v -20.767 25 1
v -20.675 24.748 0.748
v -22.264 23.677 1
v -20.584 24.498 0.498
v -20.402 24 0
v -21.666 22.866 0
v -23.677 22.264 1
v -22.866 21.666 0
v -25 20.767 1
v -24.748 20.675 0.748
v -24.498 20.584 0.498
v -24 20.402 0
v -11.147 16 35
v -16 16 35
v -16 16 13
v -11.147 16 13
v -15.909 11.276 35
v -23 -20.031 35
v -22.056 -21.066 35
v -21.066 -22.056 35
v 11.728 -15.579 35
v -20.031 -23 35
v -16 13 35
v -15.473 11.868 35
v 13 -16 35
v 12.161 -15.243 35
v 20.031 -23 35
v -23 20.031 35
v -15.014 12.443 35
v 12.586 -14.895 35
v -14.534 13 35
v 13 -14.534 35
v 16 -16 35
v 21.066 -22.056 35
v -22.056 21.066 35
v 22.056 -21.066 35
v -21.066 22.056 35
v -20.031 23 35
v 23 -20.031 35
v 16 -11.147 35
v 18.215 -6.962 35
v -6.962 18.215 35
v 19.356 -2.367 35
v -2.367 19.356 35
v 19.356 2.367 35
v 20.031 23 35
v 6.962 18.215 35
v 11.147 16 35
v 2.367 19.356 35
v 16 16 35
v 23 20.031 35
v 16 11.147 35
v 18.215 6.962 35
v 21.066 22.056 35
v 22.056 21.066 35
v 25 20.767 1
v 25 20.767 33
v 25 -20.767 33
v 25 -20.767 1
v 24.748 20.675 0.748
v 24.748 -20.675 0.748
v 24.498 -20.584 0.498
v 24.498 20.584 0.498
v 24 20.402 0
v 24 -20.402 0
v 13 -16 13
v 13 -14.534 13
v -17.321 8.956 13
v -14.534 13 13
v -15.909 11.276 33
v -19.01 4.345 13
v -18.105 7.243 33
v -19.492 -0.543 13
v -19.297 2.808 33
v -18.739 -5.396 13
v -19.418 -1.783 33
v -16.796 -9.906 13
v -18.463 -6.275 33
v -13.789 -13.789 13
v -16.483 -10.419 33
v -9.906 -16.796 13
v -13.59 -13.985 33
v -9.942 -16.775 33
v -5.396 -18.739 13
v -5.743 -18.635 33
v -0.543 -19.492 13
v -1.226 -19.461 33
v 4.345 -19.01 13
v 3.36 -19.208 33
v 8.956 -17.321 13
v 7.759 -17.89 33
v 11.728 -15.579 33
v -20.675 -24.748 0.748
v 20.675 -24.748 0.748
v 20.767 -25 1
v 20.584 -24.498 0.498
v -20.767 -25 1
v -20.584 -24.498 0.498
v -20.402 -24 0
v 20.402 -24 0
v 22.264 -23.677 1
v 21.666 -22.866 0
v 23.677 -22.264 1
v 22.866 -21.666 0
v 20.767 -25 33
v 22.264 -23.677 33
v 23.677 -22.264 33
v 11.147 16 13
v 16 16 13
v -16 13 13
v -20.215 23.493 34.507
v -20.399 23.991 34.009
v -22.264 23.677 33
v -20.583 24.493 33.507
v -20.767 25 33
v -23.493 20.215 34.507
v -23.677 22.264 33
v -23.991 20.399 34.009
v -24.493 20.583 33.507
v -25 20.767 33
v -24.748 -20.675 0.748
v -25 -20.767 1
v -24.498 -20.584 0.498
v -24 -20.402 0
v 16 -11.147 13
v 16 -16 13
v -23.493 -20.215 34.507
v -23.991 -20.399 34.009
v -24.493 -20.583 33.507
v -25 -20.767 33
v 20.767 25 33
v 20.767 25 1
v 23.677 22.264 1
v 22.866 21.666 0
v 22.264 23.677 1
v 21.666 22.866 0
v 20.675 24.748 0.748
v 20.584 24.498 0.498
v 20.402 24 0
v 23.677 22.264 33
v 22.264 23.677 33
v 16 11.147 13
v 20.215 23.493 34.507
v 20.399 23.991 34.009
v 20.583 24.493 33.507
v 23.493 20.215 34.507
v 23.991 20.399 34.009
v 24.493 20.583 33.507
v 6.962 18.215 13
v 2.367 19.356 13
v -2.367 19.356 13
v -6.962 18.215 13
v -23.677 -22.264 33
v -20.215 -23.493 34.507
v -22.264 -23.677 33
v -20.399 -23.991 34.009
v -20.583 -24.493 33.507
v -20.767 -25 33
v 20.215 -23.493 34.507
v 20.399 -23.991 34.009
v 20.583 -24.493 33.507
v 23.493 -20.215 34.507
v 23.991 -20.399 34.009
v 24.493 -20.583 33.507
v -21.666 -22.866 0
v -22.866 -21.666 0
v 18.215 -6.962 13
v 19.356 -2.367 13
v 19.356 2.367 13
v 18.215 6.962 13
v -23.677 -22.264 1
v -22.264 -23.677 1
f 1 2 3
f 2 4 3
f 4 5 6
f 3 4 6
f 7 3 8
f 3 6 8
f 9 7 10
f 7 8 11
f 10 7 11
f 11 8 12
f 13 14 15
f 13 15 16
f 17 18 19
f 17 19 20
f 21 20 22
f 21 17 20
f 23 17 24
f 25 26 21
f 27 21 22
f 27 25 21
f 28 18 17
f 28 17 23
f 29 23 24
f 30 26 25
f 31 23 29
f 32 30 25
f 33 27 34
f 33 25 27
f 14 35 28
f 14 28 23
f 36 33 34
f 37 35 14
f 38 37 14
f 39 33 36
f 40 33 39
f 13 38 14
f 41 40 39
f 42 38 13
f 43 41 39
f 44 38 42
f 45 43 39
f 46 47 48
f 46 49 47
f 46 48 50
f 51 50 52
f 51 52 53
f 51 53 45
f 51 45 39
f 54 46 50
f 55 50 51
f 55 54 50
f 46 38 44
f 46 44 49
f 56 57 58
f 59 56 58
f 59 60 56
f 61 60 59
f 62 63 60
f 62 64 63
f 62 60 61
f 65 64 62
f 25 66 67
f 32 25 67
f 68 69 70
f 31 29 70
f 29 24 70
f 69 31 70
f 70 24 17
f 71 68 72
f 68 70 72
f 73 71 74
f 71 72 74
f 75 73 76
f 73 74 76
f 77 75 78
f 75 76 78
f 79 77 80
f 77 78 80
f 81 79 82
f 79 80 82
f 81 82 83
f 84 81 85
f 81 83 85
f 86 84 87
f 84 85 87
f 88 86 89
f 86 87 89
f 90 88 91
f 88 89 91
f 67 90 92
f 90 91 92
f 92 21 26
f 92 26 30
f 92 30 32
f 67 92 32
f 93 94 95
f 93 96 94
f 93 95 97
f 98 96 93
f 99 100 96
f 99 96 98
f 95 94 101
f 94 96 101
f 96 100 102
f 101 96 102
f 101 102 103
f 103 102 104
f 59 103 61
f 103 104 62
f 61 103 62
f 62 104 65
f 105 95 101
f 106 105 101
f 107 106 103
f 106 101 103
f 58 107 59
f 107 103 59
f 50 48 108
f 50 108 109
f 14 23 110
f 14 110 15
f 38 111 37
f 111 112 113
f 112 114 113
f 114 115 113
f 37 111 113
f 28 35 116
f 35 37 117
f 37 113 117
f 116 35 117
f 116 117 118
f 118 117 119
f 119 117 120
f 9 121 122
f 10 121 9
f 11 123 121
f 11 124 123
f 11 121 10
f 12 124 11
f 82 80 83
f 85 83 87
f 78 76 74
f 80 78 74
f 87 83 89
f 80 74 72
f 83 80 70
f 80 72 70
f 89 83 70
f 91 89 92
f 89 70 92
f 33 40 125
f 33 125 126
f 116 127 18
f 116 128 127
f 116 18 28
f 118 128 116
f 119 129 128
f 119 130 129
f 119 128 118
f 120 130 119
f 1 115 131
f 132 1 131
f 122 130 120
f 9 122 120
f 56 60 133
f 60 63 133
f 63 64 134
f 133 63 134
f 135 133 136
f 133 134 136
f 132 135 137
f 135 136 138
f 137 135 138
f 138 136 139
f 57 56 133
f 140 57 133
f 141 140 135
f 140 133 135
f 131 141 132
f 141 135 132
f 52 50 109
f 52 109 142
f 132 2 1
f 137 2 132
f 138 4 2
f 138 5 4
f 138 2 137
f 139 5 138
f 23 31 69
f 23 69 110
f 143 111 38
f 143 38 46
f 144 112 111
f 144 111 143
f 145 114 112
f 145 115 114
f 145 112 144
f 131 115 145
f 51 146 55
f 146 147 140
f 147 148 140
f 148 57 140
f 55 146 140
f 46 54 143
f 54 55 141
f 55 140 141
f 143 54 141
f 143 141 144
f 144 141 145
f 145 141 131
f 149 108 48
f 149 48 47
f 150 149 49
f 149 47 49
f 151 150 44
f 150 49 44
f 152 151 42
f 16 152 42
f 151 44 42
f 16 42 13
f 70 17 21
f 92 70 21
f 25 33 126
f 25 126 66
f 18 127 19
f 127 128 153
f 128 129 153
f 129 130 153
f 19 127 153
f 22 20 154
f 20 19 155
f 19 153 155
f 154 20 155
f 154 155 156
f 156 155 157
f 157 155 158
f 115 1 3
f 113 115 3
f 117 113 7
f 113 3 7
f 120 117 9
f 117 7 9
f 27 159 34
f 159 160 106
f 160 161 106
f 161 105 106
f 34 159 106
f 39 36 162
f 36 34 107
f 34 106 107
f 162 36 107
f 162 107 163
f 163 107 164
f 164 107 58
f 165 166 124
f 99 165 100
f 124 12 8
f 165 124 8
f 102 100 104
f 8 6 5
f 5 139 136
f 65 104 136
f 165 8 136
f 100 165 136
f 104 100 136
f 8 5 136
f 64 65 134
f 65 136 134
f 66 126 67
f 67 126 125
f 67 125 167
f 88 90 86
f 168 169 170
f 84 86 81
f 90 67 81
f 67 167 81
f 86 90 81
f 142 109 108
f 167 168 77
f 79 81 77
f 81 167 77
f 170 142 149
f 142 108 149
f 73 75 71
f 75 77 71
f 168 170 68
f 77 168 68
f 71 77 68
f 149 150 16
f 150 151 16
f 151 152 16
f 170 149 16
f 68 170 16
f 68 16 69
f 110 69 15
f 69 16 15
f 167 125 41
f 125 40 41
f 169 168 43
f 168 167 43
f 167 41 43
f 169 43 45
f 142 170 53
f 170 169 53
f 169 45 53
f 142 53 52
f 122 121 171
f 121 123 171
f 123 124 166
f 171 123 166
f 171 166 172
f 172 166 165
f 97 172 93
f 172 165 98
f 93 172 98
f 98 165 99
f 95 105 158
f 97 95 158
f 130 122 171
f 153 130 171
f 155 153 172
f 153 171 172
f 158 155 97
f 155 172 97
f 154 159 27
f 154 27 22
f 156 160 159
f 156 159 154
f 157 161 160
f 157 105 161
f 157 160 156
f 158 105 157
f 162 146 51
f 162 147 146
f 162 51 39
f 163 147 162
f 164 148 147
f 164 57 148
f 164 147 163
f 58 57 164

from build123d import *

# Parameters (mm, degrees)
SKETCH_R        = 32.5
PAD_DEPTH       = 35
POCKET_DEPTH    = 22
SKETCH002_R     = 19.5
POCKET001_DEPTH = 22
POCKET002_DEPTH = 35.001
PAD001_DEPTH    = 2
CHAMFER_SIZE    = 2
CHAMFER001_SIZE = 1


with BuildPart() as part:
    # Sketch → Pad (new body)
    with BuildSketch(Plane.XY):
        Circle(SKETCH_R)
    extrude(amount=PAD_DEPTH)

    # Sketch001 (on Face3 of Pad) → Pocket (cut)
    with BuildSketch(Plane.XY.offset(35)):
        Polygon((-16, 16), (16, 16), (16, -16), (13, -16), (13, 13), (-16, 13), align=None)
    extrude(amount=-POCKET_DEPTH, mode=Mode.SUBTRACT)

    # Sketch002 (on Face3 of Pocket) → Pocket001 (cut)
    with BuildSketch(Plane.XY.offset(35)):
        Circle(SKETCH002_R)
    extrude(amount=-POCKET001_DEPTH, mode=Mode.SUBTRACT)

    # Sketch003 (on Face3 of Pocket001) → Pocket002 (cut, through all)
    with BuildSketch(Plane.XY.offset(35)):
        Polygon((25, 25), (25, -25), (67.494446, -25), (72.347168, 49.819519), (-56.328224, 49.819519), (-56.328224, -44.339888), (22.106388, -44.339888), (28.22, -25), (-25, -25), (-25, 25), align=None)
    extrude(amount=-POCKET002_DEPTH, mode=Mode.SUBTRACT)

    # Sketch004 (on Face4 of Pocket002) → Pad001 (join)
    with BuildSketch(Plane.XY.offset(35)):
        with BuildLine():
            ThreePointArc((-17.789269, 13.103439), (-15.397541, -15.845313), (13.607864, -17.406443))
            Line((-17.789269, 13.103439), (13.607864, -17.406443))
        make_face()
    extrude(amount=-PAD001_DEPTH)

    # Chamfer
    chamfer_edges = [part.edges().sort_by_distance(p)[0] for p in [
        (0, -25, 35),
        (22.98097, -22.98097, 35),
        (25, 0, 35),
        (22.98097, 22.98097, 35),
        (0, 25, 35),
        (-22.98097, 22.98097, 35),
        (-25, 0, 35),
        (-22.98097, -22.98097, 35),
    ]]
    chamfer(chamfer_edges, length=CHAMFER_SIZE)

    # Chamfer001
    chamfer001_edges = [part.edges().sort_by_distance(p)[0] for p in [
        (25, 0, 0),
        (22.98097, -22.98097, 0),
        (0, -25, 0),
        (-22.98097, -22.98097, 0),
        (-25, 0, 0),
        (-22.98097, 22.98097, 0),
        (0, 25, 0),
        (22.98097, 22.98097, 0),
    ]]
    chamfer(chamfer001_edges, length=CHAMFER001_SIZE)


solid = part.part
